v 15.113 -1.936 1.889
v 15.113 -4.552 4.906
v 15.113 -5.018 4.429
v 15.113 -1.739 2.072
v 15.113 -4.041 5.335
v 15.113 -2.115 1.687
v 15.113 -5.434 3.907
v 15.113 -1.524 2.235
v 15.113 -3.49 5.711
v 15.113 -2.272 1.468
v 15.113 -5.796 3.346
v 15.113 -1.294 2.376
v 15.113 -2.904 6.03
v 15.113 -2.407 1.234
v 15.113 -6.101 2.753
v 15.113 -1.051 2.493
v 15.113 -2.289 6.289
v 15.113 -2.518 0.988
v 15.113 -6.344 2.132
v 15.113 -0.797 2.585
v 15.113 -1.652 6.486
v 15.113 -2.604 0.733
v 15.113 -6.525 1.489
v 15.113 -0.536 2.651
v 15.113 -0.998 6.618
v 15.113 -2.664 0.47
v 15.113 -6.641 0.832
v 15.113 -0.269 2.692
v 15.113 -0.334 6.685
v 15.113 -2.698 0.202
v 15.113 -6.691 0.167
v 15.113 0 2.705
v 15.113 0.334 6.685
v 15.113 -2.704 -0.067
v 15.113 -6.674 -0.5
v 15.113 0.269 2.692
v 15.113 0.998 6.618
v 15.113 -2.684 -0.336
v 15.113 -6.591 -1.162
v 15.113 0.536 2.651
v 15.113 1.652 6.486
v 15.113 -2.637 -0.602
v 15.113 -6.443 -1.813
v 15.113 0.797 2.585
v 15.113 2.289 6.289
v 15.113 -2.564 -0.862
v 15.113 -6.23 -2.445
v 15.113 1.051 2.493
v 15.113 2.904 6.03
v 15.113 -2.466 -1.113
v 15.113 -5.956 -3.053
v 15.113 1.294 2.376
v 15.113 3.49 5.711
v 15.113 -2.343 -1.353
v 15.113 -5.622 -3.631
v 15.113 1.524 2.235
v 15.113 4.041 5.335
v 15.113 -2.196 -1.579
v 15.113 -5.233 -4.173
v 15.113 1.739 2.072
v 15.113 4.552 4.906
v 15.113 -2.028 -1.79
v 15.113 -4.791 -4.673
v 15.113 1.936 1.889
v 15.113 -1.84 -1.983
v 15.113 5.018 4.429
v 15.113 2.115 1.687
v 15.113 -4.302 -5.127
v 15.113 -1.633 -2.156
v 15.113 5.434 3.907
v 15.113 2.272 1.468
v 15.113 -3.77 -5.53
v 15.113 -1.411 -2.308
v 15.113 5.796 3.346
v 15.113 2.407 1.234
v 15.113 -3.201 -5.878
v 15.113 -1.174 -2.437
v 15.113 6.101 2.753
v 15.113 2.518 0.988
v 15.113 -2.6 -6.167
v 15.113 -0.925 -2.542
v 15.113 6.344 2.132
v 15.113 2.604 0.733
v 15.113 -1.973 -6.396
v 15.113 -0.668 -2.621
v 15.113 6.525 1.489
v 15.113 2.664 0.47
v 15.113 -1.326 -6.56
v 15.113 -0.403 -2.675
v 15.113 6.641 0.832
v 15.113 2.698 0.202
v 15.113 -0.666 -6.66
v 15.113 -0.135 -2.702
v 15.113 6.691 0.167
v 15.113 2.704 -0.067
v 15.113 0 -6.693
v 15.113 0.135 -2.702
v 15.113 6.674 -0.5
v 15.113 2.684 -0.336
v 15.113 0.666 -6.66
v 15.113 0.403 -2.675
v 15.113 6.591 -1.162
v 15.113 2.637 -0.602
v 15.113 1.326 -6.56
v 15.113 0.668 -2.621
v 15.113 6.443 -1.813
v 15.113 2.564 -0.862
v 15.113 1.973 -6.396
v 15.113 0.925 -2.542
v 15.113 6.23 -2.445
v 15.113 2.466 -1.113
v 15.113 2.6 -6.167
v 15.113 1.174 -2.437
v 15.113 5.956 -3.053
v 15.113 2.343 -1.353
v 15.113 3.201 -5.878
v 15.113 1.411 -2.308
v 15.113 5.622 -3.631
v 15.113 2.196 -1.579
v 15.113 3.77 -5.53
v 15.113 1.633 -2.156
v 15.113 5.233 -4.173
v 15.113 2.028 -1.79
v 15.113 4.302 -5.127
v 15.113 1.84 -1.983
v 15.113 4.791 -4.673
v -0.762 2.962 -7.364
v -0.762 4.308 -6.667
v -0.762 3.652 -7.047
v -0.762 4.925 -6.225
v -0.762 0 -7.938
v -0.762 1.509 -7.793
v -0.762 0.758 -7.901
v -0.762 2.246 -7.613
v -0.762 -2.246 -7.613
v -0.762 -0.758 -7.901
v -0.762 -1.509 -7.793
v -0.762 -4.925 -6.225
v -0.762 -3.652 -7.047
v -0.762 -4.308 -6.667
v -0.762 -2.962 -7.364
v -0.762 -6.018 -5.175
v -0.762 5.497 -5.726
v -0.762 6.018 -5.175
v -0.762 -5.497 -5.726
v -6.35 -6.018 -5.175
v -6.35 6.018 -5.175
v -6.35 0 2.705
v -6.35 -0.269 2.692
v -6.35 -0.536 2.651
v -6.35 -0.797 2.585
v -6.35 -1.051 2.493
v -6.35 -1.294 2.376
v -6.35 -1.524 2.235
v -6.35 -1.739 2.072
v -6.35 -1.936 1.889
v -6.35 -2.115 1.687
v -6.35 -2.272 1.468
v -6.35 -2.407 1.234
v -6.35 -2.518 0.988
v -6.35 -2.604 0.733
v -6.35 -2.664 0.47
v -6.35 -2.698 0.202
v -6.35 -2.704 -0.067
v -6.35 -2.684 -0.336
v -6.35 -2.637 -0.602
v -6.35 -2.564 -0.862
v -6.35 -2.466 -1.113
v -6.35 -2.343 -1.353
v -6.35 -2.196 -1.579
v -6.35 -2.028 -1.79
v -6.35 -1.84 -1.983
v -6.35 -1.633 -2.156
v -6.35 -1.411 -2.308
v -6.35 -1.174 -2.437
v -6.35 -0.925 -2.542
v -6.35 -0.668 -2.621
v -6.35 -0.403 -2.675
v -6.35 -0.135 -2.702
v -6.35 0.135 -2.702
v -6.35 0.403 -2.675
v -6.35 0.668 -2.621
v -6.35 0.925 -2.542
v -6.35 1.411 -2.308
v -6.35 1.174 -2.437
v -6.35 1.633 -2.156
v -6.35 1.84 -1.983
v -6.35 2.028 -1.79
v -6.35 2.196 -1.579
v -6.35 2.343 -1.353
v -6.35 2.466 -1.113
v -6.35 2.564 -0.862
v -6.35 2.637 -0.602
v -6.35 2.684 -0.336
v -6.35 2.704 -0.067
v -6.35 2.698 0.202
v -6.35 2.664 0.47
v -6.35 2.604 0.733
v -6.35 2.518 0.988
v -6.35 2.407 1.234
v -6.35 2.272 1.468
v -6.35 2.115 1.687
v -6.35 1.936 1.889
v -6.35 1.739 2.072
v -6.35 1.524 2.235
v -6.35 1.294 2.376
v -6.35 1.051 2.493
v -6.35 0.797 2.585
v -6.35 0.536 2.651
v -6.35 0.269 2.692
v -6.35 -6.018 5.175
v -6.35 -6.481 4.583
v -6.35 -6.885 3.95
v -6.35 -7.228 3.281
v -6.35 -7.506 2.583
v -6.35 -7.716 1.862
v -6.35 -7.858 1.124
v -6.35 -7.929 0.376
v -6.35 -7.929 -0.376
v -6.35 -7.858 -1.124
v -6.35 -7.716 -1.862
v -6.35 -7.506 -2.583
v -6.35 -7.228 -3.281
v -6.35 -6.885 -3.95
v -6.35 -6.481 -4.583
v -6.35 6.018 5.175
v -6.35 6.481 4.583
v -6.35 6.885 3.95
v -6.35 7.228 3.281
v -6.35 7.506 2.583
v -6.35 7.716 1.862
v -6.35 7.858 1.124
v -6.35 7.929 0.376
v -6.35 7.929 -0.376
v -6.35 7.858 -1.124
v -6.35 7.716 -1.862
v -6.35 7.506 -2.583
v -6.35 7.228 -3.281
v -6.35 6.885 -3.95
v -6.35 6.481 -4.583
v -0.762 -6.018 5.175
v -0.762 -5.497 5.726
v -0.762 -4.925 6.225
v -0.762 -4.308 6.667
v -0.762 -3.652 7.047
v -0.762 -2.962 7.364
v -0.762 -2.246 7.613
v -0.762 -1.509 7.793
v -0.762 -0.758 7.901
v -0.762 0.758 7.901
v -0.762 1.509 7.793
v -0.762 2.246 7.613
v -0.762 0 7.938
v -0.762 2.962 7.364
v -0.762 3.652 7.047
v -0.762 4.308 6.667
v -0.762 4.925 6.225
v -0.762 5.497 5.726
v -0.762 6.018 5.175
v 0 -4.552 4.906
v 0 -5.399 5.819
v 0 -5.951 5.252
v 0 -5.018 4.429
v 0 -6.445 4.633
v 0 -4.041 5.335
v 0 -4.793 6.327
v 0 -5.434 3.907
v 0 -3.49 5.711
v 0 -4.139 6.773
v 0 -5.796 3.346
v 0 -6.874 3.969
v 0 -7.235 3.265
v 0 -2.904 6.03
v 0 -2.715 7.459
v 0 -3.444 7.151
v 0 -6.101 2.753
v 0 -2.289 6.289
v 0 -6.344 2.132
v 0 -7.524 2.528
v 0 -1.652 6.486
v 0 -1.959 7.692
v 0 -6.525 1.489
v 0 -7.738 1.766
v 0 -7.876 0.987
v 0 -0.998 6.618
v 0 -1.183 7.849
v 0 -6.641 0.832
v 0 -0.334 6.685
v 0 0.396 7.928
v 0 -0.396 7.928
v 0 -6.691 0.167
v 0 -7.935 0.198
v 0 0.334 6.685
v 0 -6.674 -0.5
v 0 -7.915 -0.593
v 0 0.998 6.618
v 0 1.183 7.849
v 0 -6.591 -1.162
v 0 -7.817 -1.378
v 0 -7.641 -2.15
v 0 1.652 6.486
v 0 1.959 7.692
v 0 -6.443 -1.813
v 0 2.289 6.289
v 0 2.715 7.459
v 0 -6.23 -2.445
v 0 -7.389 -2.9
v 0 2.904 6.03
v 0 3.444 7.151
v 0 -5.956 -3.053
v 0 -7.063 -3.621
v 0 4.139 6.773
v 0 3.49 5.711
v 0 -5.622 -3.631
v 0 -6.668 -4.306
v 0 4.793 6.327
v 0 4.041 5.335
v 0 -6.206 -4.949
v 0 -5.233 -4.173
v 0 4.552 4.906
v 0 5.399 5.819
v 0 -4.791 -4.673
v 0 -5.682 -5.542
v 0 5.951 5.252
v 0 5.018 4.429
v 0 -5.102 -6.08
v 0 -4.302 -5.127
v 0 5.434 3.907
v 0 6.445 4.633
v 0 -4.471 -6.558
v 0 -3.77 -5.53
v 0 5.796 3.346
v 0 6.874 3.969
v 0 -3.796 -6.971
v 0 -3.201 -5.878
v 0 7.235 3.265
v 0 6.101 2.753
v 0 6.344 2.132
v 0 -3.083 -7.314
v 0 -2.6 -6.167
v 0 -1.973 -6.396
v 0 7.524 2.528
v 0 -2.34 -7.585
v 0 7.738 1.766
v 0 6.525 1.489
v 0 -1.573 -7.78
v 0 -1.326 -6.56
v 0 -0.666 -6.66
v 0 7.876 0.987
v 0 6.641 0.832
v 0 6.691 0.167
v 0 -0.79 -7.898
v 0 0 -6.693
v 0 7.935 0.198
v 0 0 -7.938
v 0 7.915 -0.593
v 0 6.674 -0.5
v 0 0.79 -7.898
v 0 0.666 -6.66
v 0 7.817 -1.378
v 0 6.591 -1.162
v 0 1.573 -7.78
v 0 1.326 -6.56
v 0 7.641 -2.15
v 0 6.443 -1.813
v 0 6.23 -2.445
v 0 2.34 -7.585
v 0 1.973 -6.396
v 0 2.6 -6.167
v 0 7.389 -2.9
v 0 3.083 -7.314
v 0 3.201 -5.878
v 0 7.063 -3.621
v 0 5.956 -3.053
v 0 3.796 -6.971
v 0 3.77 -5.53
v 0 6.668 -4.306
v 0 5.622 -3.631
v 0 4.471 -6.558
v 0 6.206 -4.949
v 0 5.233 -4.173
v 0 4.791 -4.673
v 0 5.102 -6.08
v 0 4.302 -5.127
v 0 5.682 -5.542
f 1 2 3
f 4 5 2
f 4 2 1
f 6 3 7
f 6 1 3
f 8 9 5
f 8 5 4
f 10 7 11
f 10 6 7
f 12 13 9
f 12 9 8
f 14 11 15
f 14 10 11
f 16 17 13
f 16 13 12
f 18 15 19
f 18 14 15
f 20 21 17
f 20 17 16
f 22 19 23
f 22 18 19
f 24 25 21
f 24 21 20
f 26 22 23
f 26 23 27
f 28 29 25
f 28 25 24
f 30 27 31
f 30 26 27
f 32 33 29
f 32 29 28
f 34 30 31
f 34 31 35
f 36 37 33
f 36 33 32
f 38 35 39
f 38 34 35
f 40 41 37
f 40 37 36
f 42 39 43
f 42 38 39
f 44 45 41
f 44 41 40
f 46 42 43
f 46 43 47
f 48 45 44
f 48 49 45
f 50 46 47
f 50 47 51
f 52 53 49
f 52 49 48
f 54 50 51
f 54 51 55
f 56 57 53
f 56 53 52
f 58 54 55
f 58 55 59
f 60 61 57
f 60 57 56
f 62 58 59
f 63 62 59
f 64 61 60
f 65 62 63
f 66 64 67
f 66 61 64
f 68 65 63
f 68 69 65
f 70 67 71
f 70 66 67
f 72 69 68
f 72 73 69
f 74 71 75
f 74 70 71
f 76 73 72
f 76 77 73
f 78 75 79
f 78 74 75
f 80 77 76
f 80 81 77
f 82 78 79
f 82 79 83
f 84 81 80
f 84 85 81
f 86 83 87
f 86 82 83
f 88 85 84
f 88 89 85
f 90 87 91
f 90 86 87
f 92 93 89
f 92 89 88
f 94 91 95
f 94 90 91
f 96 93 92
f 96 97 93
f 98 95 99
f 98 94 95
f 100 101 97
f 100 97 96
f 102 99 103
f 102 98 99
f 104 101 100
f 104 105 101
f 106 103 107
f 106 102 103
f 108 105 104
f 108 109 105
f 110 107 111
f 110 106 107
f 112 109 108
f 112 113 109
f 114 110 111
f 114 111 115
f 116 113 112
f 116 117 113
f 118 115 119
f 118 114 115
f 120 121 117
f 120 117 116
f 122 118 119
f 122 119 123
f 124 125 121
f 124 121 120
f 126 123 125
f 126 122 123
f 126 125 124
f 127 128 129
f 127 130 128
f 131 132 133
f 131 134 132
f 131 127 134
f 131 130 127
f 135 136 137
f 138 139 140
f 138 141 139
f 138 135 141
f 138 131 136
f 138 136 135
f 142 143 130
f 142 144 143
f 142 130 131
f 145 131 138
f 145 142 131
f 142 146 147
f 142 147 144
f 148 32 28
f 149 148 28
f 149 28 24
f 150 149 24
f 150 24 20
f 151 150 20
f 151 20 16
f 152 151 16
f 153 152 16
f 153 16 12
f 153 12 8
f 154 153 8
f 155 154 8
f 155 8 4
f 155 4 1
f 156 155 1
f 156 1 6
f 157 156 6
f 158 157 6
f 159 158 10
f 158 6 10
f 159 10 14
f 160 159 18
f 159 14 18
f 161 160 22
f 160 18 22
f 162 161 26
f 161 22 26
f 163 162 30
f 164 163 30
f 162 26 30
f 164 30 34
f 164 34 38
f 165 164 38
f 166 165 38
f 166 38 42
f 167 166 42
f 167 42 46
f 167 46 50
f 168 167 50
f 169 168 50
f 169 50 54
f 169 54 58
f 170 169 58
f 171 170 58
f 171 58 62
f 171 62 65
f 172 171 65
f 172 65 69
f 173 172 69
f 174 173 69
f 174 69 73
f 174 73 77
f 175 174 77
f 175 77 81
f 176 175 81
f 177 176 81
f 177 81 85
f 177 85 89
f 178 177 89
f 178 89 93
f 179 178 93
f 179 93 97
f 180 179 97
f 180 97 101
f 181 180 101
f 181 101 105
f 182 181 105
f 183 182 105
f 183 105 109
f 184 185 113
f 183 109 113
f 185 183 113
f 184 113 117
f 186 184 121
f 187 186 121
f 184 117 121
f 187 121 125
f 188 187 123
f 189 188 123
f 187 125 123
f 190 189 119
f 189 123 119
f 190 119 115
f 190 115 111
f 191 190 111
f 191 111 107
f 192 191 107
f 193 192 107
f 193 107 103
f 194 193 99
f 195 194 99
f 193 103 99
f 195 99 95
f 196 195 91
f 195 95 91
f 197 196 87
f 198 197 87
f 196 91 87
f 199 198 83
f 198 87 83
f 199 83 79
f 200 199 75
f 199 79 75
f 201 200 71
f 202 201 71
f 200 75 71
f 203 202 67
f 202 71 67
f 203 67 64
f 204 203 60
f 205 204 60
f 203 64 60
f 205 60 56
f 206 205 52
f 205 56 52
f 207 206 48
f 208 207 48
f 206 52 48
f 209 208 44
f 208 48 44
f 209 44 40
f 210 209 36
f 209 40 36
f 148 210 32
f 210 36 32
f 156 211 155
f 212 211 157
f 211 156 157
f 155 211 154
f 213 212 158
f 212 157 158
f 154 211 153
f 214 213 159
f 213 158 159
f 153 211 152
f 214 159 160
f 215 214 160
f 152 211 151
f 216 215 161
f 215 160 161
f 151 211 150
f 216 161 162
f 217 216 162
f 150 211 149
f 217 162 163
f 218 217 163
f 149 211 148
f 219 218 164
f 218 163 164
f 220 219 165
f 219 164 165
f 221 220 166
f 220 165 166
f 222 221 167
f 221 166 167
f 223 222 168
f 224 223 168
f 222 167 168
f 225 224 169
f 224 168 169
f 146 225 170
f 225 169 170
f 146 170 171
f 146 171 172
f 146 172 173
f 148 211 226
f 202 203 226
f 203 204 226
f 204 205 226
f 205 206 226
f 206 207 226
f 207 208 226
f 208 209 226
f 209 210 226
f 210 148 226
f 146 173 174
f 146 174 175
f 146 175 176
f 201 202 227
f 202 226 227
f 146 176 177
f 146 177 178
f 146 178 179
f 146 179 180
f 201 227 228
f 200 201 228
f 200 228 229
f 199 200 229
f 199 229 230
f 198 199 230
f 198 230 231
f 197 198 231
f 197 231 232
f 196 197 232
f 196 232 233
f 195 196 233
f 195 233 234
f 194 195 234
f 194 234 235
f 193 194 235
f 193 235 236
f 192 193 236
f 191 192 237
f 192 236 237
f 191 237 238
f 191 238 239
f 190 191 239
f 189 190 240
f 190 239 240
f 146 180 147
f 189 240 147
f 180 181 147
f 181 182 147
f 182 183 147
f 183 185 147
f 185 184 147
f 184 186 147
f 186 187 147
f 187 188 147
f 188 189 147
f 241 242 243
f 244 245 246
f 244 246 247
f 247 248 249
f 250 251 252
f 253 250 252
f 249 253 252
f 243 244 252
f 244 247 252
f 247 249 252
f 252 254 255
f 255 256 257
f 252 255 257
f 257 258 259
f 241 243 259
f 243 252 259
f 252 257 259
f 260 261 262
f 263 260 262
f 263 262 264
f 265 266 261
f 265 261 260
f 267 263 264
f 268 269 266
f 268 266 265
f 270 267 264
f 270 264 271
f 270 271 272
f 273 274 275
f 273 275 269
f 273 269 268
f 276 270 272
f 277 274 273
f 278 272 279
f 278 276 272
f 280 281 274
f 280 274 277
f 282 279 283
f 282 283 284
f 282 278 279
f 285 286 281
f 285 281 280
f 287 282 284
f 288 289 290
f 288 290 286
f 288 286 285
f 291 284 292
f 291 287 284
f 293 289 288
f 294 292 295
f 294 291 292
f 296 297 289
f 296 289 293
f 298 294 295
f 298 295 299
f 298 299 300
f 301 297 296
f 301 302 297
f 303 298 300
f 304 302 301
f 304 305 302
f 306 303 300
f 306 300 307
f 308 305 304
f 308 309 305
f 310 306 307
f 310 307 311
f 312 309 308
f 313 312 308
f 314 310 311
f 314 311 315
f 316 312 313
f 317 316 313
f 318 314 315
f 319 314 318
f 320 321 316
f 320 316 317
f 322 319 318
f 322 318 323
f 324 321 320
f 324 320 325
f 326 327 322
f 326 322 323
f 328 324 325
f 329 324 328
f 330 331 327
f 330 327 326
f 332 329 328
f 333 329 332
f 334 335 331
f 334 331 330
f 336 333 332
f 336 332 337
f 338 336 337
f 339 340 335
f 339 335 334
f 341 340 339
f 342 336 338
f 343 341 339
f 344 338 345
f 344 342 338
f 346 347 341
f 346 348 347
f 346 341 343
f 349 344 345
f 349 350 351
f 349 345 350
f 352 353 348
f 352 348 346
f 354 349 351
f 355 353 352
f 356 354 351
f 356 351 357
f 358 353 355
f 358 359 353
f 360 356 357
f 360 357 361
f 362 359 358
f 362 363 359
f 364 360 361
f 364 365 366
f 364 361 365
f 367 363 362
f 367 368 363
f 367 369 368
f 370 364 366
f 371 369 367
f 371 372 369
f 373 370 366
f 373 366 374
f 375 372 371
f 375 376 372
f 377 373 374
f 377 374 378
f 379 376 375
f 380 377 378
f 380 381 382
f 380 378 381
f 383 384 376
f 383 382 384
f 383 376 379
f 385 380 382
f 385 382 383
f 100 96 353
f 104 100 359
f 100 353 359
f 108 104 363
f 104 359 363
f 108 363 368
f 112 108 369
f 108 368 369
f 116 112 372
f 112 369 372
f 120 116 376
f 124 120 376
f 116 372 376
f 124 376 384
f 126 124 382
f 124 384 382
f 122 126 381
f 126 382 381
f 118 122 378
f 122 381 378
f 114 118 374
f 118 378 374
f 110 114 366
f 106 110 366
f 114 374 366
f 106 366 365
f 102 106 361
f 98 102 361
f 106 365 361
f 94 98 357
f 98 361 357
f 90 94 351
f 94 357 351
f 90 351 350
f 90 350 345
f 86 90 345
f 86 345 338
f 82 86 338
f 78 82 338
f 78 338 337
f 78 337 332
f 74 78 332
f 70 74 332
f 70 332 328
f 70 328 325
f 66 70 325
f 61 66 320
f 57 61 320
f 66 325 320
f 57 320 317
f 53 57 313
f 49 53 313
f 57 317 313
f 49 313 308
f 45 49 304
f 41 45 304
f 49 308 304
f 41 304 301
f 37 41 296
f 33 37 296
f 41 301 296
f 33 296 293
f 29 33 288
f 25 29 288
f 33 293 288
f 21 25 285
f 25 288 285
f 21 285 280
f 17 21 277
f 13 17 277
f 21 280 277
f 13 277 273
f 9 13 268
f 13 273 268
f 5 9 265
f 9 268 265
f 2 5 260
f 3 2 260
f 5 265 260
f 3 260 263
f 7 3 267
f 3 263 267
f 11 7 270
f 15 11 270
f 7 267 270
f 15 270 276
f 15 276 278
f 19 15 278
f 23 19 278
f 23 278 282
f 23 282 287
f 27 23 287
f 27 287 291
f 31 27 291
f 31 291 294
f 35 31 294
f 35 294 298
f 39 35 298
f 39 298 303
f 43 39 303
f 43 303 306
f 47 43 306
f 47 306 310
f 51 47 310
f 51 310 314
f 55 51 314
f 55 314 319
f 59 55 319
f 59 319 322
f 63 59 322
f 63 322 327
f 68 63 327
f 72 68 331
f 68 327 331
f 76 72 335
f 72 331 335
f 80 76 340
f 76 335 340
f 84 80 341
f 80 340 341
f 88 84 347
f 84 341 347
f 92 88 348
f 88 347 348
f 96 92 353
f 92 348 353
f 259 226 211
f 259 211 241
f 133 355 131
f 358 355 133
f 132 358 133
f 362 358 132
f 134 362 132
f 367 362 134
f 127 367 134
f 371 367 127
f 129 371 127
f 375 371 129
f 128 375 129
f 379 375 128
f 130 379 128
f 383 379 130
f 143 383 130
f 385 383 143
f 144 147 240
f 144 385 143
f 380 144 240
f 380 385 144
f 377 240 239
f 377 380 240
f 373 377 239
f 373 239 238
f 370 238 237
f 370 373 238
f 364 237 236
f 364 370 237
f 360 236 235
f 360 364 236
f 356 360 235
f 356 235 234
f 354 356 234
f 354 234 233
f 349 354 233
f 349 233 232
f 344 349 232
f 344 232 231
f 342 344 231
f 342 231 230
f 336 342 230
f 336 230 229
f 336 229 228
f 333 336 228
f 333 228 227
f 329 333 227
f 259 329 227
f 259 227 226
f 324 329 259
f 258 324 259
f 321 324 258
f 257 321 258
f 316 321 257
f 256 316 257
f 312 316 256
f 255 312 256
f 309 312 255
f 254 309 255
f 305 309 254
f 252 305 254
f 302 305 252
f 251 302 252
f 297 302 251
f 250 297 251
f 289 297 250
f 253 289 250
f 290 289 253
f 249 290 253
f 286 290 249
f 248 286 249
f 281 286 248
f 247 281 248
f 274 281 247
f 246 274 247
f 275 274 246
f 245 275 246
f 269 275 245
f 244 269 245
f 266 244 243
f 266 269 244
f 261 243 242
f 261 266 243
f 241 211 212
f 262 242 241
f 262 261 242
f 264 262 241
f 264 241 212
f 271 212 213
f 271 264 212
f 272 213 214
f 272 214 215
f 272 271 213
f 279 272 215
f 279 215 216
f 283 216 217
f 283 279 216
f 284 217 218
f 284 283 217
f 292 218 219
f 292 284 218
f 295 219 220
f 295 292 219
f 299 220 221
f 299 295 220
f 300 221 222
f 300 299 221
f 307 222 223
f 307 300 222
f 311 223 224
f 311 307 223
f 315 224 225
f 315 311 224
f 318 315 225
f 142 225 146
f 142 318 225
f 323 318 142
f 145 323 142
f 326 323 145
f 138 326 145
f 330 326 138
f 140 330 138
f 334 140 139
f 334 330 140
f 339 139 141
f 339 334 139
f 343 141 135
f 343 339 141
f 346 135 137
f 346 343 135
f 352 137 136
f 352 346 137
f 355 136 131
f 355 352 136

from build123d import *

# Parameters (mm, degrees)
SKETCH2_R               = 7.9375
BOSS_EXTRUDE1_DEPTH     = 6.35
SKETCH3_R               = 6.6929
BOSS_EXTRUDE2_DEPTH     = 15.113
SKETCH4_W               = 5.588
SKETCH4_H               = 2.76225
CUT_EXTRUDE1_DEPTH      = 6.35
F_1_4_28_TAPPED_HOLE1_D = 5.4102


with BuildPart() as part:
    # Sketch2 → Boss-Extrude1 (new body)
    with BuildSketch(Plane(origin=(0, 0, 0), x_dir=(0, 0, -1), z_dir=(1, 0, 0))):
        Circle(SKETCH2_R)
    extrude(amount=-BOSS_EXTRUDE1_DEPTH)

    # Sketch3 → Boss-Extrude2 (add)
    with BuildSketch(Plane(origin=(0, 0, 0), x_dir=(0, 0, -1), z_dir=(1, 0, 0))):
        Circle(SKETCH3_R)
    extrude(amount=BOSS_EXTRUDE2_DEPTH)

    # Sketch4 → Cut-Extrude1 (cut, symmetric)
    with BuildSketch(Plane(origin=(0, 0, 0), x_dir=(1, 0, 0), z_dir=(0, 1, 0))):
        with Locations((-3.556, 6.556375)):
            Rectangle(SKETCH4_W, SKETCH4_H)
        with Locations((-3.556, -6.556375)):
            Rectangle(SKETCH4_W, SKETCH4_H)
    extrude(amount=CUT_EXTRUDE1_DEPTH, both=True, mode=Mode.SUBTRACT)

    # 1/4-28 Tapped Hole1 (through all)
    with Locations(Plane(origin=(-6.35, 0, 0), x_dir=(0, 0, -1), z_dir=(-1, 0, 0))):
        with Locations((0, 0)):
            Hole(F_1_4_28_TAPPED_HOLE1_D / 2)


solid = part.part
